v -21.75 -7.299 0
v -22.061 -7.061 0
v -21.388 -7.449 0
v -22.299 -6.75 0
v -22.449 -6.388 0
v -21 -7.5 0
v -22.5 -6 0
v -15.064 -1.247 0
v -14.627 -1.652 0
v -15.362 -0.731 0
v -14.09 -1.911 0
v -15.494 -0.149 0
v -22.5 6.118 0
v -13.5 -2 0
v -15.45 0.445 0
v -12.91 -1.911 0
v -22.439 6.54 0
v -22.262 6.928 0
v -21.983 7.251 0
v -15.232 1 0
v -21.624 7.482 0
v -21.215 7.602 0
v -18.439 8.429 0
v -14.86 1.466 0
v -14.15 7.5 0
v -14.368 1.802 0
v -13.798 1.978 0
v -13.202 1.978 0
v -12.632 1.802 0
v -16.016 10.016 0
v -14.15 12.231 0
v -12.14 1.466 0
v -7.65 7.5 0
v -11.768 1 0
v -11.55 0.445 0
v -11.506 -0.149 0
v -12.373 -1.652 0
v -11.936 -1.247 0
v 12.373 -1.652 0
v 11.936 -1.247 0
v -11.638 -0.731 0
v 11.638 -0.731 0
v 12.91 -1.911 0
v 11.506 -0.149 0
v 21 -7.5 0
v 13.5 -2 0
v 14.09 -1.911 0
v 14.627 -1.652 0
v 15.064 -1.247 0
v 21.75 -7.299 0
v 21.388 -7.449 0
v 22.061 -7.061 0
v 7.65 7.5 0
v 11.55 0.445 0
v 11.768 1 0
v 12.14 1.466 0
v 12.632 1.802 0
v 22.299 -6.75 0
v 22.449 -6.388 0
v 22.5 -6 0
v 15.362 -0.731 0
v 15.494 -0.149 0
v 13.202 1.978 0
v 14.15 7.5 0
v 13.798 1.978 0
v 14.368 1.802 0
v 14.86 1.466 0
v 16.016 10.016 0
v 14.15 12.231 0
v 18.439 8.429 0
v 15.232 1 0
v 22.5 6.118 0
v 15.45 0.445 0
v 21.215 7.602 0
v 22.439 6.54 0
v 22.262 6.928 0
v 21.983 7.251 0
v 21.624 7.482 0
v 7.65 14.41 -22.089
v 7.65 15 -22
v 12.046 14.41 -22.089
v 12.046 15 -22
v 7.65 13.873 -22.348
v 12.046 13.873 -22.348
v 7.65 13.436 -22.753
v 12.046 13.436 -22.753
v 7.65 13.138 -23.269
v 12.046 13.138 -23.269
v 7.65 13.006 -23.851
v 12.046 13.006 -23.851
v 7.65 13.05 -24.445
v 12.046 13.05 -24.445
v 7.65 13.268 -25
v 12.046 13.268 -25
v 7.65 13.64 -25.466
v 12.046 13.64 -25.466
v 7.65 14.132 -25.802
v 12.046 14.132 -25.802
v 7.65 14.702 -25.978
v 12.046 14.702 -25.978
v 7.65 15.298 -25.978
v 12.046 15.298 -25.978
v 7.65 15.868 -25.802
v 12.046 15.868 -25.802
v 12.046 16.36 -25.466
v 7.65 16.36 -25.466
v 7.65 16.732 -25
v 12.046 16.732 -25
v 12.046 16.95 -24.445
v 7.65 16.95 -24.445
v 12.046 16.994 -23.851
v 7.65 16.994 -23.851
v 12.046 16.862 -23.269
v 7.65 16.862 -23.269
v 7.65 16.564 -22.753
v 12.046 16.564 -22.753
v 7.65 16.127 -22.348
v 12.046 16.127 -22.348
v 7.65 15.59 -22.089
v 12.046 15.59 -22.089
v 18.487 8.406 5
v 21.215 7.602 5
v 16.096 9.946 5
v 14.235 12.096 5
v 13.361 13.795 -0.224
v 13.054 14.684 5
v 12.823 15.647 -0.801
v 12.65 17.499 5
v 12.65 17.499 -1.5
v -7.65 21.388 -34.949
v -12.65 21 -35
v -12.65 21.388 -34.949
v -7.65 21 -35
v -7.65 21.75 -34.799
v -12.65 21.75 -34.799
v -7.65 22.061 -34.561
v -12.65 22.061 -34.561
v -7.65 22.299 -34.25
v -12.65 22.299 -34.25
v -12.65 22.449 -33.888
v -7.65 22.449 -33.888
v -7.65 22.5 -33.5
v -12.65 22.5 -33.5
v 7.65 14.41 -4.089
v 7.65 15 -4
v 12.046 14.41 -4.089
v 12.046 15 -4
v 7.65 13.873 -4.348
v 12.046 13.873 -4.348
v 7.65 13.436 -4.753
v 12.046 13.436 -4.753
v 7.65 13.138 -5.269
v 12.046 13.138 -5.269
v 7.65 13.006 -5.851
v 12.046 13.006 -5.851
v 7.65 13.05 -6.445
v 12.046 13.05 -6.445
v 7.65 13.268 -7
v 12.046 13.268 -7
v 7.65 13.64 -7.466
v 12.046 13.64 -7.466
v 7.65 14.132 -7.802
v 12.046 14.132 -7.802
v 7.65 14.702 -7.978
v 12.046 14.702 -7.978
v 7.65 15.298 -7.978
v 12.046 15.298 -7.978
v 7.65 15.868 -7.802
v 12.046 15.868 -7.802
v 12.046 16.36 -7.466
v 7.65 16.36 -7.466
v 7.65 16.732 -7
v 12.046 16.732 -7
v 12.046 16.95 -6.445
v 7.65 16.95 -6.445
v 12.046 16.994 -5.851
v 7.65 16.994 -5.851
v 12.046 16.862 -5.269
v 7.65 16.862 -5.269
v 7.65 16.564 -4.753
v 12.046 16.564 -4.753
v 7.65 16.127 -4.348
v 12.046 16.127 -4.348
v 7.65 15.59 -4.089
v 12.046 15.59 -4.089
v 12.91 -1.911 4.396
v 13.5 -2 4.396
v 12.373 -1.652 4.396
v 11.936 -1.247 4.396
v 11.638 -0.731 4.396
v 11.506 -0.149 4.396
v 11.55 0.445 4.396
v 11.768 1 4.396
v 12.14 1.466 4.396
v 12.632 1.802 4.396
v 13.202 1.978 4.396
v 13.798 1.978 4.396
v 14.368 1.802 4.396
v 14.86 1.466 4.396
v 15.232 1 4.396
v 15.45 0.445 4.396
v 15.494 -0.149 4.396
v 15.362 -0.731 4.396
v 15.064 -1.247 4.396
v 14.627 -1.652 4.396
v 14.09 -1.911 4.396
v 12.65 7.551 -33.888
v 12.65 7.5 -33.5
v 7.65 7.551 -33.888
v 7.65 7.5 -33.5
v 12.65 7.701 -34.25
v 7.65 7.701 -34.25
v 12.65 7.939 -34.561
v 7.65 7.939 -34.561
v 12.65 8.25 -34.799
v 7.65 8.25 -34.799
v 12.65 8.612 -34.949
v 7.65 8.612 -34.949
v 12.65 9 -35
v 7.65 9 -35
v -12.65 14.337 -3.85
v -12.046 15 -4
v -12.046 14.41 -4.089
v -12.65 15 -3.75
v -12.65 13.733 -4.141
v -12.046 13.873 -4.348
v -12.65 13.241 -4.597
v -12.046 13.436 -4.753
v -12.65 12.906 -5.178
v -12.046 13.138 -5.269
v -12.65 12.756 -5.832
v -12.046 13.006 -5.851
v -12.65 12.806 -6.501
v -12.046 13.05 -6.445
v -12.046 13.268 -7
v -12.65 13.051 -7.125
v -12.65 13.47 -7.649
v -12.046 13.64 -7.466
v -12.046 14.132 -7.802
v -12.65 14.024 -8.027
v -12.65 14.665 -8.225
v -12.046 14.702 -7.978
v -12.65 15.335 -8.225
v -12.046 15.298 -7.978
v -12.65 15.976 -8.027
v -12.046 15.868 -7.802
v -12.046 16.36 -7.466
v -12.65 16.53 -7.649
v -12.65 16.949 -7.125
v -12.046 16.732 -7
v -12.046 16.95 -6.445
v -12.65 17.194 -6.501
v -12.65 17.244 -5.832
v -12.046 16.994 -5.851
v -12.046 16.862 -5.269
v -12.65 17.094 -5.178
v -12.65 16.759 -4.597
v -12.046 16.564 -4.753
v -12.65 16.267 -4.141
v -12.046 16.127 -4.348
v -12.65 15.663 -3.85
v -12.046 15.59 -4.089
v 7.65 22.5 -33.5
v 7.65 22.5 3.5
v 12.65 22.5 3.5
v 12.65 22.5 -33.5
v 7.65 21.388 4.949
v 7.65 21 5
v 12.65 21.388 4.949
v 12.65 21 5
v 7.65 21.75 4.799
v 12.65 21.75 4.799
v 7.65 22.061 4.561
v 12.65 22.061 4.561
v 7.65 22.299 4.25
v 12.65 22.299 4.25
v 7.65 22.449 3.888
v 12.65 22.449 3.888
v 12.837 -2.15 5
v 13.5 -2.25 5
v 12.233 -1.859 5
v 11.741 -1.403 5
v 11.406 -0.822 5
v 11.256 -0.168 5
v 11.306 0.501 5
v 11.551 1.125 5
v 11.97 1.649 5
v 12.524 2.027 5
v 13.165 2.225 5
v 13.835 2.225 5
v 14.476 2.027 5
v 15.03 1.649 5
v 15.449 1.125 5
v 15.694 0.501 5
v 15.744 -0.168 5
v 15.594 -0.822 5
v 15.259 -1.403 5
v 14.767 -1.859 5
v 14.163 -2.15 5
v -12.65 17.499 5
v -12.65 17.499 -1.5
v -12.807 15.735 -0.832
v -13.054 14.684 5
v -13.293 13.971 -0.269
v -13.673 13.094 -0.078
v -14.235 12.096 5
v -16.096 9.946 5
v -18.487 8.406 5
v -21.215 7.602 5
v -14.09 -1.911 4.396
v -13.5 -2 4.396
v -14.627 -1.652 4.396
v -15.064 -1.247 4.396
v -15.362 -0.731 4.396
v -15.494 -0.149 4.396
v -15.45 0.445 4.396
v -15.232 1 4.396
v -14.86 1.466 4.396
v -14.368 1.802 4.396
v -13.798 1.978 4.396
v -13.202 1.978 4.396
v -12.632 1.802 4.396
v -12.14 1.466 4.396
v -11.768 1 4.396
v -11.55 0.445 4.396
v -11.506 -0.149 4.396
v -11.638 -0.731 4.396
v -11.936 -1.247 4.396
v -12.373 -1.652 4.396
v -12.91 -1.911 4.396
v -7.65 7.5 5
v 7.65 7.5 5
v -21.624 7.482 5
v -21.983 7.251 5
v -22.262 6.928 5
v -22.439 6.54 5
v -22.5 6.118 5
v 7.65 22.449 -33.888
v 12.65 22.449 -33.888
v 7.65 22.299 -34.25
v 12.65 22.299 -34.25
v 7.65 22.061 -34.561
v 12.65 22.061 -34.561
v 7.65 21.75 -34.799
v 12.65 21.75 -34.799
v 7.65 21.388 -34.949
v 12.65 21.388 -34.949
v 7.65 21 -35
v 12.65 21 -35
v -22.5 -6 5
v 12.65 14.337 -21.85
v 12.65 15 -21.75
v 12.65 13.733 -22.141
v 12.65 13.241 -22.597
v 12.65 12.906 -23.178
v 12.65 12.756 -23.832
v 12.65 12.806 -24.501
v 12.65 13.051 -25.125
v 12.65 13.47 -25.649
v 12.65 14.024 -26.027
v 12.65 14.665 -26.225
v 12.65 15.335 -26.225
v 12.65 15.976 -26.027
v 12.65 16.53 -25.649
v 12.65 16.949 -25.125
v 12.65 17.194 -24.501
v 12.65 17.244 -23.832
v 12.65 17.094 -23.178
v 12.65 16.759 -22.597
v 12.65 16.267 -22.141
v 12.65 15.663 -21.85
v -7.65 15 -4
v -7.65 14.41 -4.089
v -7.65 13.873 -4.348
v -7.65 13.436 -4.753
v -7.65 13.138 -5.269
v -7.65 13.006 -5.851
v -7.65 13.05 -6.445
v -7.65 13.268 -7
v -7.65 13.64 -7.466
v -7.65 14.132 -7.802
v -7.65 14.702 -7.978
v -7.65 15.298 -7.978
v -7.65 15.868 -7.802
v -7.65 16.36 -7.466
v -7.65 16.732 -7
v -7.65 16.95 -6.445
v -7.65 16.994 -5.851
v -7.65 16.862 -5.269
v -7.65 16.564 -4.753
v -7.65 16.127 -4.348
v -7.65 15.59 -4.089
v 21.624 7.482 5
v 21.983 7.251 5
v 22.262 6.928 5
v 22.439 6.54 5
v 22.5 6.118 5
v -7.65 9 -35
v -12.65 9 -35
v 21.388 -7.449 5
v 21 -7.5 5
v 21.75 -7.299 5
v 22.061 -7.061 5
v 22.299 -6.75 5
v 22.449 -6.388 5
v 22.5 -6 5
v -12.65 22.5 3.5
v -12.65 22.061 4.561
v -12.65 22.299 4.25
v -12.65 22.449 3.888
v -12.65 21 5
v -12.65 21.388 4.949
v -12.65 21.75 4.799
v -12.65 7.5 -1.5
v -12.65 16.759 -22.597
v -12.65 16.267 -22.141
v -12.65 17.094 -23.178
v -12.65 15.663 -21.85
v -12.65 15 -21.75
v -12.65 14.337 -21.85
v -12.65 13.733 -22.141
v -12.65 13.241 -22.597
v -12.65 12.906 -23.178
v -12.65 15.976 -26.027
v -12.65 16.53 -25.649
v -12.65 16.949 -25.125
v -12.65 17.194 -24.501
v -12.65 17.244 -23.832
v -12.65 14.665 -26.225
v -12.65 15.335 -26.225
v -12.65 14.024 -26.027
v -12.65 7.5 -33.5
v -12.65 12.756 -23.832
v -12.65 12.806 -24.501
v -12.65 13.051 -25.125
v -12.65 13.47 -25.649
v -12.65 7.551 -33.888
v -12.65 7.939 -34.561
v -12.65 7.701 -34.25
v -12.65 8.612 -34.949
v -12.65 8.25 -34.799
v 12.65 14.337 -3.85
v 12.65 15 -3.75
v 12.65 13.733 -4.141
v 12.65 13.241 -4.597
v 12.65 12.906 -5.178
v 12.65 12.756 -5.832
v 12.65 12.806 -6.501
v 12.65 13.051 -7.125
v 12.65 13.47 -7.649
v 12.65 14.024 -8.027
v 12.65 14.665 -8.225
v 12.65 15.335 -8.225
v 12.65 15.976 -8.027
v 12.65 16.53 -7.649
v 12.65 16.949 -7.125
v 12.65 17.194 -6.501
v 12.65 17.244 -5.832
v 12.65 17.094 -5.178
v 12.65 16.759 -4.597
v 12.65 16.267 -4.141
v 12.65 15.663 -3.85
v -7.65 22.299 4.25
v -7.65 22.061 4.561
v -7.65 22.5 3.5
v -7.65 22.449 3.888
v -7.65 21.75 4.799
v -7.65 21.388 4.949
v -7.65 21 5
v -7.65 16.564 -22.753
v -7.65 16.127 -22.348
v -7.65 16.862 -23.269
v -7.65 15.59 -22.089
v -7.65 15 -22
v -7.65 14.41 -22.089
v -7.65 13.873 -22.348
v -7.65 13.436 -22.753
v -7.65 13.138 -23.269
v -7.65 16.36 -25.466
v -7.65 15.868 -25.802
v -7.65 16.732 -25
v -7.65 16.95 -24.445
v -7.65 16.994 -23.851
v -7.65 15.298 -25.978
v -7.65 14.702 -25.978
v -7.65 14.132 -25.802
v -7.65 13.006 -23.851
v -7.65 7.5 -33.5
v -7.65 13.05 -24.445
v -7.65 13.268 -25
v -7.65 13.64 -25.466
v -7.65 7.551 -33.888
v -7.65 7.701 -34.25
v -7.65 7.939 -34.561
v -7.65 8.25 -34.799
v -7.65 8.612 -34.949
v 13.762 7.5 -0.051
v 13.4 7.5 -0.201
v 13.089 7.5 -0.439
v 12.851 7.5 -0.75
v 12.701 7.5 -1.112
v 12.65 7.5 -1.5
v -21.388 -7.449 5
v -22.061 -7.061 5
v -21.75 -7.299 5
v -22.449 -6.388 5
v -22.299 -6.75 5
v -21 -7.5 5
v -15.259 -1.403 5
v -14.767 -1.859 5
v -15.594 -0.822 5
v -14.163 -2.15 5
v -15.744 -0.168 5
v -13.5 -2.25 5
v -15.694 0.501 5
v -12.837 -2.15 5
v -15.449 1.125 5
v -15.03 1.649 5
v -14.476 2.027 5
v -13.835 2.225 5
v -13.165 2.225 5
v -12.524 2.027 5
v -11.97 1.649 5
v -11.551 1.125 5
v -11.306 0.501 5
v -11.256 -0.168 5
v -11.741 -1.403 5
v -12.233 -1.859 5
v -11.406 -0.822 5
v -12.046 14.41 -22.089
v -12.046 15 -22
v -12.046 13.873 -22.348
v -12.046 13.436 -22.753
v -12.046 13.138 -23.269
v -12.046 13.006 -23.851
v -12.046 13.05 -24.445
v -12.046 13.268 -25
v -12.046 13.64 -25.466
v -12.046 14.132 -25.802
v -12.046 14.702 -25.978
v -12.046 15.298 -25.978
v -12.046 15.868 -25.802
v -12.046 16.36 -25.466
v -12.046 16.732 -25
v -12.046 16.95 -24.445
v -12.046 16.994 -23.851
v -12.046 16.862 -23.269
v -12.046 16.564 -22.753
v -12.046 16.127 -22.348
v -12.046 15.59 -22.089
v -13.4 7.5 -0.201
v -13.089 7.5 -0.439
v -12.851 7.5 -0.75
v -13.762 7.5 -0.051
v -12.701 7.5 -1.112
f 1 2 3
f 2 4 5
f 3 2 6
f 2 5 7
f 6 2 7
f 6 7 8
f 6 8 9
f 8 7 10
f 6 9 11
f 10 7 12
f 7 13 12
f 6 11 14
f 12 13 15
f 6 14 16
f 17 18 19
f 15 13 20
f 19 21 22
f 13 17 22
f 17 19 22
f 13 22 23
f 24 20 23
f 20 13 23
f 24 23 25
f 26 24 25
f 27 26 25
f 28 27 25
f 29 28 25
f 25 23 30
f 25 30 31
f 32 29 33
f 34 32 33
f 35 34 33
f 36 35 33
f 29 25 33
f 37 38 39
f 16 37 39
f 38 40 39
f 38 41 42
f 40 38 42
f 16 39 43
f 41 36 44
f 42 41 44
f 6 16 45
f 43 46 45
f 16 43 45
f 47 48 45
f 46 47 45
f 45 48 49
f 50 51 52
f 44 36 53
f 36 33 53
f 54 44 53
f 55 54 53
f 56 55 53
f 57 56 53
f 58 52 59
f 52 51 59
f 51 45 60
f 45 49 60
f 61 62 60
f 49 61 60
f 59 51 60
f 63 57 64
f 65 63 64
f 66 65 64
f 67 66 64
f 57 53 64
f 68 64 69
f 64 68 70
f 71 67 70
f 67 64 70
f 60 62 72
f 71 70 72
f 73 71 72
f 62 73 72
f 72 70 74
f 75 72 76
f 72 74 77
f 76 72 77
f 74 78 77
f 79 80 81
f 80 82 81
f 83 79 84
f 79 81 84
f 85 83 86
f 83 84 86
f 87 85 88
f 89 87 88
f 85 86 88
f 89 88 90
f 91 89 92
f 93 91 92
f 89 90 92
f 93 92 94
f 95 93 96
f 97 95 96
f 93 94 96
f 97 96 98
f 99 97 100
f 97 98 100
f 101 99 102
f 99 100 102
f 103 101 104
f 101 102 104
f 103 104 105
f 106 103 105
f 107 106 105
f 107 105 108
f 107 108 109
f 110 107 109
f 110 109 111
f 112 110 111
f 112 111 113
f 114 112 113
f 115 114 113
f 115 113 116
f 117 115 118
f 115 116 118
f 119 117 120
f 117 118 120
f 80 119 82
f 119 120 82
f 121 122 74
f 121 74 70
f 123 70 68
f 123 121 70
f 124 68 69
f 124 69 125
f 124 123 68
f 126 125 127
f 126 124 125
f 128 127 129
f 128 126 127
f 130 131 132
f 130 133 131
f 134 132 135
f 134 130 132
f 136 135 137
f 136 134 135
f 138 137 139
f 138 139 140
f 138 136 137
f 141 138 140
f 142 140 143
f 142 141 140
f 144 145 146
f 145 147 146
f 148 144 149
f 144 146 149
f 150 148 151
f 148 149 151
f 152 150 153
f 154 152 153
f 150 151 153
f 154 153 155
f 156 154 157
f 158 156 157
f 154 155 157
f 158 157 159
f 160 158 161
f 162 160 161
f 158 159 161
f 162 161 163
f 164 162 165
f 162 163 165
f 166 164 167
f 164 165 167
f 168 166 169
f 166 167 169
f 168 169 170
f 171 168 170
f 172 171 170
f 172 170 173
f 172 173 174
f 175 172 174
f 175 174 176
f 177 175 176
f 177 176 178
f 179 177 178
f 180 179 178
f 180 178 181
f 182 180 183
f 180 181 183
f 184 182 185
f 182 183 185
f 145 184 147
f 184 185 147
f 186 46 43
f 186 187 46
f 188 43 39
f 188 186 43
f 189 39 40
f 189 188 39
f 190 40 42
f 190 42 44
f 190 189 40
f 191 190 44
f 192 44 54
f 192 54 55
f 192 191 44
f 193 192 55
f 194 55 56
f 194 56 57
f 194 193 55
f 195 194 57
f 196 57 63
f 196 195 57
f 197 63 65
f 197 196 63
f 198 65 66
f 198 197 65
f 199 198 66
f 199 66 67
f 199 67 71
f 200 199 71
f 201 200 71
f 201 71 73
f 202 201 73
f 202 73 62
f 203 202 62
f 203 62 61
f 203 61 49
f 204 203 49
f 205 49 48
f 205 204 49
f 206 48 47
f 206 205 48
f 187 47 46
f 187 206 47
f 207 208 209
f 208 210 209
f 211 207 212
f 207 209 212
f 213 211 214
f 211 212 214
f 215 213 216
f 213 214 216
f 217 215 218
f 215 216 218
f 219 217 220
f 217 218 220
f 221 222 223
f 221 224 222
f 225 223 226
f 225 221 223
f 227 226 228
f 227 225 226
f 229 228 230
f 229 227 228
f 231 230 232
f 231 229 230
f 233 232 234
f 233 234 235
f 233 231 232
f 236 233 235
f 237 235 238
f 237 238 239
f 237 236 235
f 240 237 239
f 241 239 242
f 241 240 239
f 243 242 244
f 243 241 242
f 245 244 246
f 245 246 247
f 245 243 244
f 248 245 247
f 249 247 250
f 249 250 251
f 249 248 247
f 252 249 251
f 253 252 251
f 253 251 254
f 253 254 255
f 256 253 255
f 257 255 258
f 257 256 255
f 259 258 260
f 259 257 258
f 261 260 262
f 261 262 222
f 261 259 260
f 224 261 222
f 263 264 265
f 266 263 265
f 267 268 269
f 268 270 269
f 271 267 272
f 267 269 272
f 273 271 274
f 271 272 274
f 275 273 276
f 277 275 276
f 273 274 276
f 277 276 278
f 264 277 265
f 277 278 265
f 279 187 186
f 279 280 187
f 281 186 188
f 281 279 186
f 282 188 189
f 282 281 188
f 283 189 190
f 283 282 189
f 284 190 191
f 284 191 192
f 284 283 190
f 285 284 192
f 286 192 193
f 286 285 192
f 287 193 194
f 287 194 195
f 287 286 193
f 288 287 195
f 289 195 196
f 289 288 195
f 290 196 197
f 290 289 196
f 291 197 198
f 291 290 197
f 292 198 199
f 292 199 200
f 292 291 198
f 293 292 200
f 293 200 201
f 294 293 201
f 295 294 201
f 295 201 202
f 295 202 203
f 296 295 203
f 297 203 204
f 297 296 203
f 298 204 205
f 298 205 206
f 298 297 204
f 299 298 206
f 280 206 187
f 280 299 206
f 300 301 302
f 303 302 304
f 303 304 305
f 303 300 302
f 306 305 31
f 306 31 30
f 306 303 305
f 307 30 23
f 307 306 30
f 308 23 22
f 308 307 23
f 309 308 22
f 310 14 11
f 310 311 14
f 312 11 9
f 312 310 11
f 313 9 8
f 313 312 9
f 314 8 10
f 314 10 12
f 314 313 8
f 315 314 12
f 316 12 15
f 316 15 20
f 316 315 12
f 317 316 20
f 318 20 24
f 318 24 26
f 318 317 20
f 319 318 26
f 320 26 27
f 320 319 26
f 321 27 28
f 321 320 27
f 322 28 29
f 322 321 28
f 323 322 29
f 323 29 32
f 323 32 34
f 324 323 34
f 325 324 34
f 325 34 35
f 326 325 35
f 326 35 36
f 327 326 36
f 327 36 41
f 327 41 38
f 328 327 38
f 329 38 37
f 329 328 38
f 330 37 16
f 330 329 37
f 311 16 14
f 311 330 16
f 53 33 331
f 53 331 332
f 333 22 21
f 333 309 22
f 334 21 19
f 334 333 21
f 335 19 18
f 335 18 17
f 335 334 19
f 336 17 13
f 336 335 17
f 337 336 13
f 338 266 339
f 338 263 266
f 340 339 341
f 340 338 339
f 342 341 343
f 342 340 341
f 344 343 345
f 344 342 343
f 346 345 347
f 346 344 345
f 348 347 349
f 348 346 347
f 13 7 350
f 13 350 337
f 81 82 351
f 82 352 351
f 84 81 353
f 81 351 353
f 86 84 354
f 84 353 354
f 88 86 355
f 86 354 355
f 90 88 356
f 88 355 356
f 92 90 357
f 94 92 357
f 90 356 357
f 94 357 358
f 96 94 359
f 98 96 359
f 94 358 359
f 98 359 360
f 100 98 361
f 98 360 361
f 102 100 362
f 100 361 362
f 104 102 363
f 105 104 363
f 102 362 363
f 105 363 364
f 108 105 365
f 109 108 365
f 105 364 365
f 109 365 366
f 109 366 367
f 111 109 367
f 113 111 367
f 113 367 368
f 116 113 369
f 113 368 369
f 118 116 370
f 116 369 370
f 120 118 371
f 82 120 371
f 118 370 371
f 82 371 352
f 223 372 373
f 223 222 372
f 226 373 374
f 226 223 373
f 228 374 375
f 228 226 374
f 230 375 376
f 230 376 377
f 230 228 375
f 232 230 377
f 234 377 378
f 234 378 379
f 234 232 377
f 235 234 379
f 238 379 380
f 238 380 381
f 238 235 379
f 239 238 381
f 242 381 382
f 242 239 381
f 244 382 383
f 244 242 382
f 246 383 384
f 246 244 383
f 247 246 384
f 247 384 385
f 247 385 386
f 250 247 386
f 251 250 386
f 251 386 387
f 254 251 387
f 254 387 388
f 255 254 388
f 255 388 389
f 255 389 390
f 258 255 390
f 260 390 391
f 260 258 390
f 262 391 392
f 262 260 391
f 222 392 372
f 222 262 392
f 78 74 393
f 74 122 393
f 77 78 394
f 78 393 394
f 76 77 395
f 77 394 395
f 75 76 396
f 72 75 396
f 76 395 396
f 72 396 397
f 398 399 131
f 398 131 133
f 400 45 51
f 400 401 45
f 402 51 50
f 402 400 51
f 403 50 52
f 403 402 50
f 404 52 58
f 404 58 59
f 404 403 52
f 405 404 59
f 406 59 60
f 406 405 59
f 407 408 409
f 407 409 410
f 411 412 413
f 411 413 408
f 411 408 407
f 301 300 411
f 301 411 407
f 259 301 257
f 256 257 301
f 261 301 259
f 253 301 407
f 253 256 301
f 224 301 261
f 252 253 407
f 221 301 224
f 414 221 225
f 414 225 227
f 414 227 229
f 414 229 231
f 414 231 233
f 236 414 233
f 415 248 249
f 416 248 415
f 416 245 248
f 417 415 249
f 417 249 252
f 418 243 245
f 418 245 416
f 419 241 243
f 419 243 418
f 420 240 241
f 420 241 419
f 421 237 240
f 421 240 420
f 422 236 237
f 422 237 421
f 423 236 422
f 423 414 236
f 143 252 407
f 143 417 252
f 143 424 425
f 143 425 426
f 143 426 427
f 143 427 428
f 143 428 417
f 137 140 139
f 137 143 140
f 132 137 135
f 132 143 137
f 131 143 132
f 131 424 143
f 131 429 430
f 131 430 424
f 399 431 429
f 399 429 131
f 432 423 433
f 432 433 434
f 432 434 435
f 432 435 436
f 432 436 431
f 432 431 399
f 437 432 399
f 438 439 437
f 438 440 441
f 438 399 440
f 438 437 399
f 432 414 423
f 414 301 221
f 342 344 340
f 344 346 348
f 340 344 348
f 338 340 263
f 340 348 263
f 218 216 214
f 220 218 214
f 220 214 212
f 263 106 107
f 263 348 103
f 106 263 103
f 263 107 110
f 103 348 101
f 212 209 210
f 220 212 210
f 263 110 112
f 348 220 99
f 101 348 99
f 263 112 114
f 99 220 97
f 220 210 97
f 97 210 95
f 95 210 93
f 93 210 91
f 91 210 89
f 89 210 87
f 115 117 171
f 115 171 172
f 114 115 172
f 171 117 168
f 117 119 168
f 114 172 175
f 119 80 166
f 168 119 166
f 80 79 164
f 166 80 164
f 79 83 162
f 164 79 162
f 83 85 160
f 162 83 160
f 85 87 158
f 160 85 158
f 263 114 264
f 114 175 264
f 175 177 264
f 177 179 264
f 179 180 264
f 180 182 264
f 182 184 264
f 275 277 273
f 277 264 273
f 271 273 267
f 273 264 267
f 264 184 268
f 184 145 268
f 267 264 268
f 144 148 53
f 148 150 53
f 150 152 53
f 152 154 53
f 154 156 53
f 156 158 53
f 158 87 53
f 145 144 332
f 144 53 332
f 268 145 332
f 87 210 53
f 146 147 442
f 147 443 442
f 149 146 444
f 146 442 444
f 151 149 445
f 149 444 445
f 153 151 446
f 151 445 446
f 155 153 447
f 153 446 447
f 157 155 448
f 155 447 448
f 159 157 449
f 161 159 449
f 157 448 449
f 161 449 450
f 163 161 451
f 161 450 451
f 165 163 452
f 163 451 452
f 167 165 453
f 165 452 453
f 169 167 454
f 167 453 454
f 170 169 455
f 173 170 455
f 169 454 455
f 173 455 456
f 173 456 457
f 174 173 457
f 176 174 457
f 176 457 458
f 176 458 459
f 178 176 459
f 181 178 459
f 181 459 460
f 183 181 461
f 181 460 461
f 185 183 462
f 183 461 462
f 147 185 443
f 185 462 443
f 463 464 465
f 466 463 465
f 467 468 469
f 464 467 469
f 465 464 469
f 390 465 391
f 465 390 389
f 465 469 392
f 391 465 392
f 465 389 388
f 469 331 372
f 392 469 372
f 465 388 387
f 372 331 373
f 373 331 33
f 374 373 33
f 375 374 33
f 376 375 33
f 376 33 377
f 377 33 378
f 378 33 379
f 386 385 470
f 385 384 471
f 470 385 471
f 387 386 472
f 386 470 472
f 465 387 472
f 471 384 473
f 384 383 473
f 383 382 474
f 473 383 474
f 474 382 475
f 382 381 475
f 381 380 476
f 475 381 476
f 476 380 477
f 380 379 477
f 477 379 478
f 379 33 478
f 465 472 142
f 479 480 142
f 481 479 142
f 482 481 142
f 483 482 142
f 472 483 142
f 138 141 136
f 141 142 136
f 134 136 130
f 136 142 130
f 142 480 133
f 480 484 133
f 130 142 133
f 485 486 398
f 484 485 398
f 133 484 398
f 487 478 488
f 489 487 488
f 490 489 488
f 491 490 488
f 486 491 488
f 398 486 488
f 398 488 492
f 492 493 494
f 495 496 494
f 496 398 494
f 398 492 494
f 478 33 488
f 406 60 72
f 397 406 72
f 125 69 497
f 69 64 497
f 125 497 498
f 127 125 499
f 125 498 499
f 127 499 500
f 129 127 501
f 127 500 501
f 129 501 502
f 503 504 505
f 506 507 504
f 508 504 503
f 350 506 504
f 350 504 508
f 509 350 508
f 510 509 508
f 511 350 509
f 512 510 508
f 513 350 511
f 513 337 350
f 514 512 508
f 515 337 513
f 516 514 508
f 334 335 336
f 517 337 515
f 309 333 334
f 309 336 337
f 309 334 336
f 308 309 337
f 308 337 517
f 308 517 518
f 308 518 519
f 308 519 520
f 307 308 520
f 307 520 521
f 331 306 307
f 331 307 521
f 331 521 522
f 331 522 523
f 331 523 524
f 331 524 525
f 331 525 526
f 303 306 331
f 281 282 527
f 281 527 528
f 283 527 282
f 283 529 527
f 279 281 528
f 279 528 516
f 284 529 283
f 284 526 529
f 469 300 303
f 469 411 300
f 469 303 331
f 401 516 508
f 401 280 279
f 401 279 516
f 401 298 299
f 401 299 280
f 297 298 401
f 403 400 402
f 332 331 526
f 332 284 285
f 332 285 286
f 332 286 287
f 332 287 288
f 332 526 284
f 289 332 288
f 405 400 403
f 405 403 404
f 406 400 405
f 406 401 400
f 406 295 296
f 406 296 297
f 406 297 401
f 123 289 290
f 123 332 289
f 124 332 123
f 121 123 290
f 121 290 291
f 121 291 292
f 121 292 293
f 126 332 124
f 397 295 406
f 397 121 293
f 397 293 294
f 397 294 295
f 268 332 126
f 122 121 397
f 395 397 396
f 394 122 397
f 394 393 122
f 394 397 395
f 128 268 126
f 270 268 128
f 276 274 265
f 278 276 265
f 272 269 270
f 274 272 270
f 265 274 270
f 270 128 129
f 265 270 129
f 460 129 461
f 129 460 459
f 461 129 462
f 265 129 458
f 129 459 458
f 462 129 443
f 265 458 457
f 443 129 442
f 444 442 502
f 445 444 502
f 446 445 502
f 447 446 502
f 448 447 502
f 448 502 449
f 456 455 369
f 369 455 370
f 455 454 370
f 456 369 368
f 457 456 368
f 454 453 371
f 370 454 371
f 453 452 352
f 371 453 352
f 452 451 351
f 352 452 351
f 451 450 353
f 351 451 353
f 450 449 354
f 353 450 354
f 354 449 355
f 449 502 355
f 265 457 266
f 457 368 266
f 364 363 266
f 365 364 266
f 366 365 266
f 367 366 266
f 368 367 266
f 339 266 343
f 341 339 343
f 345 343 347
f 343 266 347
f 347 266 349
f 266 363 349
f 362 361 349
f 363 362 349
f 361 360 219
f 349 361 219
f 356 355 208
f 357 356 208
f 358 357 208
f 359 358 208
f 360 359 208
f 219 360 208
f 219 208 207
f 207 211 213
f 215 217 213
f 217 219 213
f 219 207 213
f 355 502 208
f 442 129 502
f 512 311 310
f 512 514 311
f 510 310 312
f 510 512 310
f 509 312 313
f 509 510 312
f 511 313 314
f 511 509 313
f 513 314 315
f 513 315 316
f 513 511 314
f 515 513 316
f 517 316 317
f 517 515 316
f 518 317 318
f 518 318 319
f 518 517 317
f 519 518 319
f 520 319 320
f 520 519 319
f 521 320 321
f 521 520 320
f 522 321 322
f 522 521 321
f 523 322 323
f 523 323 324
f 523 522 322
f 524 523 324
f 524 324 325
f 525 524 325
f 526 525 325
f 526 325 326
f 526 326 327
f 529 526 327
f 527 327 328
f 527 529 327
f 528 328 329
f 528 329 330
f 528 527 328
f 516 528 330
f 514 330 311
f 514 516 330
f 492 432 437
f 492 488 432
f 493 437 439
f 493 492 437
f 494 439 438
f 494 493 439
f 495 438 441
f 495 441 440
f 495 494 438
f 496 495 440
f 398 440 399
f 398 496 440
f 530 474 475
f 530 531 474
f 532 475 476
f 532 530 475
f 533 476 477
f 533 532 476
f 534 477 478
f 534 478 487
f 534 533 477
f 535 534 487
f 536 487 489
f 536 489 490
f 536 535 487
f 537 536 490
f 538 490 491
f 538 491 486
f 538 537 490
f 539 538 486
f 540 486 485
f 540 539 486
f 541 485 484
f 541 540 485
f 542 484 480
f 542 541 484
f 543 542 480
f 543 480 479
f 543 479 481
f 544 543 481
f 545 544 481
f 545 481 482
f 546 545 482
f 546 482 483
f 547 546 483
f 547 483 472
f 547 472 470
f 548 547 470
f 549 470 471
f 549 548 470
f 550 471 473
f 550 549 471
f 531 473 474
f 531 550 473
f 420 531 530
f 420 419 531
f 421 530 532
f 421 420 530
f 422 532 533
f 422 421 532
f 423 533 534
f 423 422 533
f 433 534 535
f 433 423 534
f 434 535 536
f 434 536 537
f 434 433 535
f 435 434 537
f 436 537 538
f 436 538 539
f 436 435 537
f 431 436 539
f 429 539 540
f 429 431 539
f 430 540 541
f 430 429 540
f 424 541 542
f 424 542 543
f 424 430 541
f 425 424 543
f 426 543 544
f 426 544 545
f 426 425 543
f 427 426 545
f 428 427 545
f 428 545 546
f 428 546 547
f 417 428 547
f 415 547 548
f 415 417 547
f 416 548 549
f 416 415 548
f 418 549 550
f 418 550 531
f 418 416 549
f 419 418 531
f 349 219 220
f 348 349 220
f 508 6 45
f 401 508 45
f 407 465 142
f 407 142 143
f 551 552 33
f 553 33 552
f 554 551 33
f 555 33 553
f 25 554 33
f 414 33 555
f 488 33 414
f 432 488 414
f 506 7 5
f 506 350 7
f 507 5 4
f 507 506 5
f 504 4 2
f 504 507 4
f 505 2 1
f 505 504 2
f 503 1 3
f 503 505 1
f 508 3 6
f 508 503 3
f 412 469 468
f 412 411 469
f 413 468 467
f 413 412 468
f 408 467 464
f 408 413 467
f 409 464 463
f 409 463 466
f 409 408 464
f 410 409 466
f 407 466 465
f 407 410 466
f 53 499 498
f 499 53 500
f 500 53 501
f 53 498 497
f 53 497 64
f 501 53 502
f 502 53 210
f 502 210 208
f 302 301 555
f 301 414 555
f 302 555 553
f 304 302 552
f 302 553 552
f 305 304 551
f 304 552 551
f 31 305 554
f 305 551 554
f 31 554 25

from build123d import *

# Parameters (mm, degrees)
SKETCH1_W                         = 45
SKETCH1_H                         = 15
BOSS_EXTRUDE1_DEPTH               = 5
BOSS_EXTRUDE2_DEPTH               = 15
F_4_0_4_DIAMETER_HOLE1_AT_2_COUNT = 2
F_4_0_4_DIAMETER_HOLE1_AT_2_PITCH = 18
F_4_0_4_DIAMETER_HOLE2_AT_2_COUNT = 2
F_4_0_4_DIAMETER_HOLE2_AT_2_PITCH = 27
FILLET1_R                         = 10
FILLET2_R                         = 1.5


with BuildPart() as part:
    # Sketch1 → Boss-Extrude1 (new body)
    with BuildSketch(Plane.XY):
        Rectangle(SKETCH1_W, SKETCH1_H)
    extrude(amount=BOSS_EXTRUDE1_DEPTH)

    # Sketch3 → Boss-Extrude2 (add)
    with BuildSketch(Plane(origin=(0, 7.5, 0), x_dir=(1, 0, 0), z_dir=(0, 1, 0))):
        Polygon((-7.65, 0), (-7.65, -5), (-12.65, -5), (-12.65, 35), (-7.65, 35), align=None)
        Polygon((7.65, -5), (12.65, -5), (12.65, 35), (7.65, 35), (7.65, 0), align=None)
    extrude(amount=BOSS_EXTRUDE2_DEPTH)

    # Sketch8 → Ø4.0 (4) Diameter Hole1 (revolve, cut)
    with BuildSketch(Plane(origin=(-12.65, 15, -24), x_dir=(0, 0, 1), z_dir=(0, 1, 0))):
        Polygon((0, 0), (0, 5), (2, 5), (2, 0.603553391), (2.25, 0), align=None)
    f_4_0_4_diameter_hole1 = revolve(axis=Axis((-19, 15, -24), (1, 0, 0)), mode=Mode.SUBTRACT)

    # Ø4.0 (4) Diameter Hole1 at 2: Ø4.0 (4) Diameter Hole1 ×2
    with Locations(*[(0, 0, i * F_4_0_4_DIAMETER_HOLE1_AT_2_PITCH) for i in range(1, F_4_0_4_DIAMETER_HOLE1_AT_2_COUNT)]):
        add(f_4_0_4_diameter_hole1, mode=Mode.SUBTRACT)

    # Mirror3: Ø4.0 (4) Diameter Hole1 across plane
    add(f_4_0_4_diameter_hole1.mirror(Plane(origin=(0, 0, 0), x_dir=(0, 0, 1), z_dir=(1, 0, 0))), mode=Mode.SUBTRACT)

    # Mirror3 copy 1 sketch → Mirror3 copy 1 (revolve, cut)
    with BuildSketch(Plane(origin=(12.65, 15, -6), x_dir=(0, 0, 1), z_dir=(0, 1, 0))):
        Polygon((0, 0), (0, -5), (2, -5), (2, -0.603553391), (2.25, 0), align=None)
    revolve(axis=Axis((19, 15, -6), (1, 0, 0)), mode=Mode.SUBTRACT)

    # Sketch12 → Ø4.0 (4) Diameter Hole2 (revolve, cut)
    with BuildSketch(Plane(origin=(13.5, 0, 5), x_dir=(0, -1, 0), z_dir=(1, 0, 0))):
        Polygon((0, 0), (0, 5), (2, 5), (2, 0.603553391), (2.25, 0), align=None)
    f_4_0_4_diameter_hole2 = revolve(axis=Axis((13.5, 0, 11.35), (0, 0, -1)), mode=Mode.SUBTRACT)

    # Ø4.0 (4) Diameter Hole2 at 2: Ø4.0 (4) Diameter Hole2 ×2
    with Locations(*[(-i * F_4_0_4_DIAMETER_HOLE2_AT_2_PITCH, 0, 0) for i in range(1, F_4_0_4_DIAMETER_HOLE2_AT_2_COUNT)]):
        add(f_4_0_4_diameter_hole2, mode=Mode.SUBTRACT)

    # Fillet1
    # the kernel refuses this fillet: 10 mm, written as the material it adds along each edge
    with BuildSketch(Plane(origin=(12.65, 7.5, 5), x_dir=(1, 0, 0), z_dir=(0, 0, -1))) as fillet1_piece_1:
        with BuildLine():
            CenterArc((10, -9.998874937), FILLET1_R, 90.859468925, 89.140531075)
            Line((0, -9.998874937), (0, 0))
            Line((0, 0), (9.85, 0))
        make_face()
    extrude(amount=5)
    with BuildSketch(Plane(origin=(-12.65, 7.5, 5), x_dir=(-1, 0, 0), z_dir=(0, 0, -1))) as fillet1_piece_2:
        with BuildLine():
            CenterArc((10, 9.998874937), FILLET1_R, 180, 89.140531075)
            Line((0, 9.998874937), (0, 0))
            Line((0, 0), (9.85, 0))
        make_face()
    extrude(amount=5)

    # Fillet2
    fillet2_edges = [part.edges().sort_by_distance(p)[0] for p in [
        (-10.15, 7.5, -35),
        (-10.15, 22.5, -35),
        (-10.15, 22.5, 5),
        (10.15, 7.5, -35),
        (10.15, 22.5, 5),
        (10.15, 22.5, -35),
        (22.5, -7.5, 2.5),
        (-22.5, -7.5, 2.5),
        (-22.5, 7.5, 2.5),
        (22.5, 7.5, 2.5),
        (12.65, 12.499437468, 0),
        (-12.65, 12.499437468, 0),
    ]]
    fillet(fillet2_edges, radius=FILLET2_R)


solid = part.part
